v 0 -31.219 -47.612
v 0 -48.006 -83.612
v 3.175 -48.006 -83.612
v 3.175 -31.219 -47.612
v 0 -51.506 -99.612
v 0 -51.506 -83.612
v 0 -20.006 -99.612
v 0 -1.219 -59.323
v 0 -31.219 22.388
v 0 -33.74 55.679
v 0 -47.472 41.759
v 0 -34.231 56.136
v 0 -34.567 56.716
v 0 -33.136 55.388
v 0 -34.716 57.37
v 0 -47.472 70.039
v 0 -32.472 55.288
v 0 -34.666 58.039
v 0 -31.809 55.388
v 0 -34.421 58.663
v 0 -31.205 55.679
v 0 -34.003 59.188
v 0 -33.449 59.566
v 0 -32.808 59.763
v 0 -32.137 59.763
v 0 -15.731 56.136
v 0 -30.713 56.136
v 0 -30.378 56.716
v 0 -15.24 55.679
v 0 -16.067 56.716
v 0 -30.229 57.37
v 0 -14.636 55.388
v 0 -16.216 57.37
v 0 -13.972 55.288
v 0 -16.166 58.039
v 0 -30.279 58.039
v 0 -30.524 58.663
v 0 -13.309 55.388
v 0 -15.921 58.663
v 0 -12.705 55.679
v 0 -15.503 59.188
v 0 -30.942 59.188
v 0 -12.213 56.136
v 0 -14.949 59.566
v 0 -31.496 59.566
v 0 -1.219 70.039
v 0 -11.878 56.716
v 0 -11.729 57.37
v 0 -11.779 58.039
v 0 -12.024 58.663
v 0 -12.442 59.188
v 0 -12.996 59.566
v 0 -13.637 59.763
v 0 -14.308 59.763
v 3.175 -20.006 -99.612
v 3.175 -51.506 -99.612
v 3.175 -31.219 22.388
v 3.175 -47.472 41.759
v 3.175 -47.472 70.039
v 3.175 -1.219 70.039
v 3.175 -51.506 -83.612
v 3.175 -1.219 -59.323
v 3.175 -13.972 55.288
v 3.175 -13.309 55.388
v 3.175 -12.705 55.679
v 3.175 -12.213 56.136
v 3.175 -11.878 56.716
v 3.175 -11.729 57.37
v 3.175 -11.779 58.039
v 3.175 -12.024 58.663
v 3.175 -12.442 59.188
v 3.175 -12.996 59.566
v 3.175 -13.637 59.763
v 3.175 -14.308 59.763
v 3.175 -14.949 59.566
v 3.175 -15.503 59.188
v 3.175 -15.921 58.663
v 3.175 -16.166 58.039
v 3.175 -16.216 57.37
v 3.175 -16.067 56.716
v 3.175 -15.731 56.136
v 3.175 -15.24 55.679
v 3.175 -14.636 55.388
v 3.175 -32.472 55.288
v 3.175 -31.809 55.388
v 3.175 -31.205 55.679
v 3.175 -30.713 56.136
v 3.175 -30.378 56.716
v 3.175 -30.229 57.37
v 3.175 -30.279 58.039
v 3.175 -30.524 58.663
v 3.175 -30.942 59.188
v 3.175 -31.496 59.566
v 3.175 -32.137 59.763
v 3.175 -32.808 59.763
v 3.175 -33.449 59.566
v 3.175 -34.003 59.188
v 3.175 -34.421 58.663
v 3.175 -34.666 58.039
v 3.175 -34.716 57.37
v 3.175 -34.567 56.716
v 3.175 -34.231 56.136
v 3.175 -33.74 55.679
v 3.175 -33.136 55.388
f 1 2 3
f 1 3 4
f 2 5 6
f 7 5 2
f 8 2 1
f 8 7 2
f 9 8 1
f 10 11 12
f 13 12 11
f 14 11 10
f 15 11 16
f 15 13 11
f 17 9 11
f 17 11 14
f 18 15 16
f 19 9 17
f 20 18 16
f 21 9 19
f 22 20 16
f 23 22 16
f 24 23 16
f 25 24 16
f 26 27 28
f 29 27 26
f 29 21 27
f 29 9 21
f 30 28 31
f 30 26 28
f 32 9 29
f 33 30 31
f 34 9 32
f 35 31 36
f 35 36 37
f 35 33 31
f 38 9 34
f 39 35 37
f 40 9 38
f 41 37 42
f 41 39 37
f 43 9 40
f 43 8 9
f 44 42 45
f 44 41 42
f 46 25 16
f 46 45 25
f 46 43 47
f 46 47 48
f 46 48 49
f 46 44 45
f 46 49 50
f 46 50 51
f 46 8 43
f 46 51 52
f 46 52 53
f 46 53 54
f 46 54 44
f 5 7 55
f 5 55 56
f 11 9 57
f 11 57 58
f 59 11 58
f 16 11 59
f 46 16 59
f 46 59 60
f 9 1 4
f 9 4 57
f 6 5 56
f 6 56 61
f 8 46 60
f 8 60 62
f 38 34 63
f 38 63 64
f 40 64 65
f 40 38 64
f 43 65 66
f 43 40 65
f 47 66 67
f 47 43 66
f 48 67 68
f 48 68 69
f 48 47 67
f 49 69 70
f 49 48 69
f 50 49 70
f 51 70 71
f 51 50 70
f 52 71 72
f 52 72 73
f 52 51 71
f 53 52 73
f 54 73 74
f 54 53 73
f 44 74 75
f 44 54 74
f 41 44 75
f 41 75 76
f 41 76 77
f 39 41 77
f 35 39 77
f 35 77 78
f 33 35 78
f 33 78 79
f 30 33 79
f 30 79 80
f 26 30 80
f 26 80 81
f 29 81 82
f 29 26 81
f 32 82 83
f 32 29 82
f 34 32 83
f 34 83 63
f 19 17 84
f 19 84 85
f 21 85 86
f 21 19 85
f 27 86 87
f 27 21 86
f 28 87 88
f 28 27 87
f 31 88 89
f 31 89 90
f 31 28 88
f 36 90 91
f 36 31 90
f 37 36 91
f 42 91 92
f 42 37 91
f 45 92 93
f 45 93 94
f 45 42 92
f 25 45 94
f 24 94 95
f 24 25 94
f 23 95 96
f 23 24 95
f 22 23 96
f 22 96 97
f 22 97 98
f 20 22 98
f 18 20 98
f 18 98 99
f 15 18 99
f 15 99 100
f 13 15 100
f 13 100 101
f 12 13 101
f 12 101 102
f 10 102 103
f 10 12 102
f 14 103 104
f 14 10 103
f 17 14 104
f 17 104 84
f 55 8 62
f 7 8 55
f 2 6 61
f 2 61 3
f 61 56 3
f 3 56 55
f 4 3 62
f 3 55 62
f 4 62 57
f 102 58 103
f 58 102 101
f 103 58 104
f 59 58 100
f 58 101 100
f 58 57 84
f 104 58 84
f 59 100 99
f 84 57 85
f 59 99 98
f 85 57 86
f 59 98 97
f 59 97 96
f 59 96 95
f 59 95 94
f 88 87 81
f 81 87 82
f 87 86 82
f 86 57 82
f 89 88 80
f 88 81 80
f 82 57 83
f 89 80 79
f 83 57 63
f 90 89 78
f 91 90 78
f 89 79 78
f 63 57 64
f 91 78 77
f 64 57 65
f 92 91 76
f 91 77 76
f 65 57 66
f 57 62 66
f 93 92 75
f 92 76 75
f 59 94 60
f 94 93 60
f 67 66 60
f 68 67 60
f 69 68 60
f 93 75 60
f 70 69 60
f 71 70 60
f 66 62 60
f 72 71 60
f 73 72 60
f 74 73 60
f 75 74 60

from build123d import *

# Parameters (mm, degrees)
SKETCH1_R           = 2.25
BOSS_EXTRUDE2_DEPTH = 3.175


with BuildPart() as part:
    # Sketch1 → Boss-Extrude2 (new body)
    with BuildSketch(Plane(origin=(0, 0, 0), x_dir=(0, 0, -1), z_dir=(1, 0, 0))):
        Polygon((-70.039073078, -1.218967506), (59.322512202, -1.218967506), (99.611526043, -20.0060432), (99.611526043, -51.5060432), (83.611526043, -51.5060432), (83.611526043, -48.0060432), (47.611526043, -31.218967506), (-22.388473957, -31.218967506), (-41.758526434, -47.472371395), (-70.039073078, -47.472371395), align=None)
        with Locations((-57.538473957, -13.972371395)):
            Circle(SKETCH1_R, mode=Mode.SUBTRACT)
        with Locations((-57.538473957, -32.472371395)):
            Circle(SKETCH1_R, mode=Mode.SUBTRACT)
    extrude(amount=BOSS_EXTRUDE2_DEPTH)


solid = part.part
